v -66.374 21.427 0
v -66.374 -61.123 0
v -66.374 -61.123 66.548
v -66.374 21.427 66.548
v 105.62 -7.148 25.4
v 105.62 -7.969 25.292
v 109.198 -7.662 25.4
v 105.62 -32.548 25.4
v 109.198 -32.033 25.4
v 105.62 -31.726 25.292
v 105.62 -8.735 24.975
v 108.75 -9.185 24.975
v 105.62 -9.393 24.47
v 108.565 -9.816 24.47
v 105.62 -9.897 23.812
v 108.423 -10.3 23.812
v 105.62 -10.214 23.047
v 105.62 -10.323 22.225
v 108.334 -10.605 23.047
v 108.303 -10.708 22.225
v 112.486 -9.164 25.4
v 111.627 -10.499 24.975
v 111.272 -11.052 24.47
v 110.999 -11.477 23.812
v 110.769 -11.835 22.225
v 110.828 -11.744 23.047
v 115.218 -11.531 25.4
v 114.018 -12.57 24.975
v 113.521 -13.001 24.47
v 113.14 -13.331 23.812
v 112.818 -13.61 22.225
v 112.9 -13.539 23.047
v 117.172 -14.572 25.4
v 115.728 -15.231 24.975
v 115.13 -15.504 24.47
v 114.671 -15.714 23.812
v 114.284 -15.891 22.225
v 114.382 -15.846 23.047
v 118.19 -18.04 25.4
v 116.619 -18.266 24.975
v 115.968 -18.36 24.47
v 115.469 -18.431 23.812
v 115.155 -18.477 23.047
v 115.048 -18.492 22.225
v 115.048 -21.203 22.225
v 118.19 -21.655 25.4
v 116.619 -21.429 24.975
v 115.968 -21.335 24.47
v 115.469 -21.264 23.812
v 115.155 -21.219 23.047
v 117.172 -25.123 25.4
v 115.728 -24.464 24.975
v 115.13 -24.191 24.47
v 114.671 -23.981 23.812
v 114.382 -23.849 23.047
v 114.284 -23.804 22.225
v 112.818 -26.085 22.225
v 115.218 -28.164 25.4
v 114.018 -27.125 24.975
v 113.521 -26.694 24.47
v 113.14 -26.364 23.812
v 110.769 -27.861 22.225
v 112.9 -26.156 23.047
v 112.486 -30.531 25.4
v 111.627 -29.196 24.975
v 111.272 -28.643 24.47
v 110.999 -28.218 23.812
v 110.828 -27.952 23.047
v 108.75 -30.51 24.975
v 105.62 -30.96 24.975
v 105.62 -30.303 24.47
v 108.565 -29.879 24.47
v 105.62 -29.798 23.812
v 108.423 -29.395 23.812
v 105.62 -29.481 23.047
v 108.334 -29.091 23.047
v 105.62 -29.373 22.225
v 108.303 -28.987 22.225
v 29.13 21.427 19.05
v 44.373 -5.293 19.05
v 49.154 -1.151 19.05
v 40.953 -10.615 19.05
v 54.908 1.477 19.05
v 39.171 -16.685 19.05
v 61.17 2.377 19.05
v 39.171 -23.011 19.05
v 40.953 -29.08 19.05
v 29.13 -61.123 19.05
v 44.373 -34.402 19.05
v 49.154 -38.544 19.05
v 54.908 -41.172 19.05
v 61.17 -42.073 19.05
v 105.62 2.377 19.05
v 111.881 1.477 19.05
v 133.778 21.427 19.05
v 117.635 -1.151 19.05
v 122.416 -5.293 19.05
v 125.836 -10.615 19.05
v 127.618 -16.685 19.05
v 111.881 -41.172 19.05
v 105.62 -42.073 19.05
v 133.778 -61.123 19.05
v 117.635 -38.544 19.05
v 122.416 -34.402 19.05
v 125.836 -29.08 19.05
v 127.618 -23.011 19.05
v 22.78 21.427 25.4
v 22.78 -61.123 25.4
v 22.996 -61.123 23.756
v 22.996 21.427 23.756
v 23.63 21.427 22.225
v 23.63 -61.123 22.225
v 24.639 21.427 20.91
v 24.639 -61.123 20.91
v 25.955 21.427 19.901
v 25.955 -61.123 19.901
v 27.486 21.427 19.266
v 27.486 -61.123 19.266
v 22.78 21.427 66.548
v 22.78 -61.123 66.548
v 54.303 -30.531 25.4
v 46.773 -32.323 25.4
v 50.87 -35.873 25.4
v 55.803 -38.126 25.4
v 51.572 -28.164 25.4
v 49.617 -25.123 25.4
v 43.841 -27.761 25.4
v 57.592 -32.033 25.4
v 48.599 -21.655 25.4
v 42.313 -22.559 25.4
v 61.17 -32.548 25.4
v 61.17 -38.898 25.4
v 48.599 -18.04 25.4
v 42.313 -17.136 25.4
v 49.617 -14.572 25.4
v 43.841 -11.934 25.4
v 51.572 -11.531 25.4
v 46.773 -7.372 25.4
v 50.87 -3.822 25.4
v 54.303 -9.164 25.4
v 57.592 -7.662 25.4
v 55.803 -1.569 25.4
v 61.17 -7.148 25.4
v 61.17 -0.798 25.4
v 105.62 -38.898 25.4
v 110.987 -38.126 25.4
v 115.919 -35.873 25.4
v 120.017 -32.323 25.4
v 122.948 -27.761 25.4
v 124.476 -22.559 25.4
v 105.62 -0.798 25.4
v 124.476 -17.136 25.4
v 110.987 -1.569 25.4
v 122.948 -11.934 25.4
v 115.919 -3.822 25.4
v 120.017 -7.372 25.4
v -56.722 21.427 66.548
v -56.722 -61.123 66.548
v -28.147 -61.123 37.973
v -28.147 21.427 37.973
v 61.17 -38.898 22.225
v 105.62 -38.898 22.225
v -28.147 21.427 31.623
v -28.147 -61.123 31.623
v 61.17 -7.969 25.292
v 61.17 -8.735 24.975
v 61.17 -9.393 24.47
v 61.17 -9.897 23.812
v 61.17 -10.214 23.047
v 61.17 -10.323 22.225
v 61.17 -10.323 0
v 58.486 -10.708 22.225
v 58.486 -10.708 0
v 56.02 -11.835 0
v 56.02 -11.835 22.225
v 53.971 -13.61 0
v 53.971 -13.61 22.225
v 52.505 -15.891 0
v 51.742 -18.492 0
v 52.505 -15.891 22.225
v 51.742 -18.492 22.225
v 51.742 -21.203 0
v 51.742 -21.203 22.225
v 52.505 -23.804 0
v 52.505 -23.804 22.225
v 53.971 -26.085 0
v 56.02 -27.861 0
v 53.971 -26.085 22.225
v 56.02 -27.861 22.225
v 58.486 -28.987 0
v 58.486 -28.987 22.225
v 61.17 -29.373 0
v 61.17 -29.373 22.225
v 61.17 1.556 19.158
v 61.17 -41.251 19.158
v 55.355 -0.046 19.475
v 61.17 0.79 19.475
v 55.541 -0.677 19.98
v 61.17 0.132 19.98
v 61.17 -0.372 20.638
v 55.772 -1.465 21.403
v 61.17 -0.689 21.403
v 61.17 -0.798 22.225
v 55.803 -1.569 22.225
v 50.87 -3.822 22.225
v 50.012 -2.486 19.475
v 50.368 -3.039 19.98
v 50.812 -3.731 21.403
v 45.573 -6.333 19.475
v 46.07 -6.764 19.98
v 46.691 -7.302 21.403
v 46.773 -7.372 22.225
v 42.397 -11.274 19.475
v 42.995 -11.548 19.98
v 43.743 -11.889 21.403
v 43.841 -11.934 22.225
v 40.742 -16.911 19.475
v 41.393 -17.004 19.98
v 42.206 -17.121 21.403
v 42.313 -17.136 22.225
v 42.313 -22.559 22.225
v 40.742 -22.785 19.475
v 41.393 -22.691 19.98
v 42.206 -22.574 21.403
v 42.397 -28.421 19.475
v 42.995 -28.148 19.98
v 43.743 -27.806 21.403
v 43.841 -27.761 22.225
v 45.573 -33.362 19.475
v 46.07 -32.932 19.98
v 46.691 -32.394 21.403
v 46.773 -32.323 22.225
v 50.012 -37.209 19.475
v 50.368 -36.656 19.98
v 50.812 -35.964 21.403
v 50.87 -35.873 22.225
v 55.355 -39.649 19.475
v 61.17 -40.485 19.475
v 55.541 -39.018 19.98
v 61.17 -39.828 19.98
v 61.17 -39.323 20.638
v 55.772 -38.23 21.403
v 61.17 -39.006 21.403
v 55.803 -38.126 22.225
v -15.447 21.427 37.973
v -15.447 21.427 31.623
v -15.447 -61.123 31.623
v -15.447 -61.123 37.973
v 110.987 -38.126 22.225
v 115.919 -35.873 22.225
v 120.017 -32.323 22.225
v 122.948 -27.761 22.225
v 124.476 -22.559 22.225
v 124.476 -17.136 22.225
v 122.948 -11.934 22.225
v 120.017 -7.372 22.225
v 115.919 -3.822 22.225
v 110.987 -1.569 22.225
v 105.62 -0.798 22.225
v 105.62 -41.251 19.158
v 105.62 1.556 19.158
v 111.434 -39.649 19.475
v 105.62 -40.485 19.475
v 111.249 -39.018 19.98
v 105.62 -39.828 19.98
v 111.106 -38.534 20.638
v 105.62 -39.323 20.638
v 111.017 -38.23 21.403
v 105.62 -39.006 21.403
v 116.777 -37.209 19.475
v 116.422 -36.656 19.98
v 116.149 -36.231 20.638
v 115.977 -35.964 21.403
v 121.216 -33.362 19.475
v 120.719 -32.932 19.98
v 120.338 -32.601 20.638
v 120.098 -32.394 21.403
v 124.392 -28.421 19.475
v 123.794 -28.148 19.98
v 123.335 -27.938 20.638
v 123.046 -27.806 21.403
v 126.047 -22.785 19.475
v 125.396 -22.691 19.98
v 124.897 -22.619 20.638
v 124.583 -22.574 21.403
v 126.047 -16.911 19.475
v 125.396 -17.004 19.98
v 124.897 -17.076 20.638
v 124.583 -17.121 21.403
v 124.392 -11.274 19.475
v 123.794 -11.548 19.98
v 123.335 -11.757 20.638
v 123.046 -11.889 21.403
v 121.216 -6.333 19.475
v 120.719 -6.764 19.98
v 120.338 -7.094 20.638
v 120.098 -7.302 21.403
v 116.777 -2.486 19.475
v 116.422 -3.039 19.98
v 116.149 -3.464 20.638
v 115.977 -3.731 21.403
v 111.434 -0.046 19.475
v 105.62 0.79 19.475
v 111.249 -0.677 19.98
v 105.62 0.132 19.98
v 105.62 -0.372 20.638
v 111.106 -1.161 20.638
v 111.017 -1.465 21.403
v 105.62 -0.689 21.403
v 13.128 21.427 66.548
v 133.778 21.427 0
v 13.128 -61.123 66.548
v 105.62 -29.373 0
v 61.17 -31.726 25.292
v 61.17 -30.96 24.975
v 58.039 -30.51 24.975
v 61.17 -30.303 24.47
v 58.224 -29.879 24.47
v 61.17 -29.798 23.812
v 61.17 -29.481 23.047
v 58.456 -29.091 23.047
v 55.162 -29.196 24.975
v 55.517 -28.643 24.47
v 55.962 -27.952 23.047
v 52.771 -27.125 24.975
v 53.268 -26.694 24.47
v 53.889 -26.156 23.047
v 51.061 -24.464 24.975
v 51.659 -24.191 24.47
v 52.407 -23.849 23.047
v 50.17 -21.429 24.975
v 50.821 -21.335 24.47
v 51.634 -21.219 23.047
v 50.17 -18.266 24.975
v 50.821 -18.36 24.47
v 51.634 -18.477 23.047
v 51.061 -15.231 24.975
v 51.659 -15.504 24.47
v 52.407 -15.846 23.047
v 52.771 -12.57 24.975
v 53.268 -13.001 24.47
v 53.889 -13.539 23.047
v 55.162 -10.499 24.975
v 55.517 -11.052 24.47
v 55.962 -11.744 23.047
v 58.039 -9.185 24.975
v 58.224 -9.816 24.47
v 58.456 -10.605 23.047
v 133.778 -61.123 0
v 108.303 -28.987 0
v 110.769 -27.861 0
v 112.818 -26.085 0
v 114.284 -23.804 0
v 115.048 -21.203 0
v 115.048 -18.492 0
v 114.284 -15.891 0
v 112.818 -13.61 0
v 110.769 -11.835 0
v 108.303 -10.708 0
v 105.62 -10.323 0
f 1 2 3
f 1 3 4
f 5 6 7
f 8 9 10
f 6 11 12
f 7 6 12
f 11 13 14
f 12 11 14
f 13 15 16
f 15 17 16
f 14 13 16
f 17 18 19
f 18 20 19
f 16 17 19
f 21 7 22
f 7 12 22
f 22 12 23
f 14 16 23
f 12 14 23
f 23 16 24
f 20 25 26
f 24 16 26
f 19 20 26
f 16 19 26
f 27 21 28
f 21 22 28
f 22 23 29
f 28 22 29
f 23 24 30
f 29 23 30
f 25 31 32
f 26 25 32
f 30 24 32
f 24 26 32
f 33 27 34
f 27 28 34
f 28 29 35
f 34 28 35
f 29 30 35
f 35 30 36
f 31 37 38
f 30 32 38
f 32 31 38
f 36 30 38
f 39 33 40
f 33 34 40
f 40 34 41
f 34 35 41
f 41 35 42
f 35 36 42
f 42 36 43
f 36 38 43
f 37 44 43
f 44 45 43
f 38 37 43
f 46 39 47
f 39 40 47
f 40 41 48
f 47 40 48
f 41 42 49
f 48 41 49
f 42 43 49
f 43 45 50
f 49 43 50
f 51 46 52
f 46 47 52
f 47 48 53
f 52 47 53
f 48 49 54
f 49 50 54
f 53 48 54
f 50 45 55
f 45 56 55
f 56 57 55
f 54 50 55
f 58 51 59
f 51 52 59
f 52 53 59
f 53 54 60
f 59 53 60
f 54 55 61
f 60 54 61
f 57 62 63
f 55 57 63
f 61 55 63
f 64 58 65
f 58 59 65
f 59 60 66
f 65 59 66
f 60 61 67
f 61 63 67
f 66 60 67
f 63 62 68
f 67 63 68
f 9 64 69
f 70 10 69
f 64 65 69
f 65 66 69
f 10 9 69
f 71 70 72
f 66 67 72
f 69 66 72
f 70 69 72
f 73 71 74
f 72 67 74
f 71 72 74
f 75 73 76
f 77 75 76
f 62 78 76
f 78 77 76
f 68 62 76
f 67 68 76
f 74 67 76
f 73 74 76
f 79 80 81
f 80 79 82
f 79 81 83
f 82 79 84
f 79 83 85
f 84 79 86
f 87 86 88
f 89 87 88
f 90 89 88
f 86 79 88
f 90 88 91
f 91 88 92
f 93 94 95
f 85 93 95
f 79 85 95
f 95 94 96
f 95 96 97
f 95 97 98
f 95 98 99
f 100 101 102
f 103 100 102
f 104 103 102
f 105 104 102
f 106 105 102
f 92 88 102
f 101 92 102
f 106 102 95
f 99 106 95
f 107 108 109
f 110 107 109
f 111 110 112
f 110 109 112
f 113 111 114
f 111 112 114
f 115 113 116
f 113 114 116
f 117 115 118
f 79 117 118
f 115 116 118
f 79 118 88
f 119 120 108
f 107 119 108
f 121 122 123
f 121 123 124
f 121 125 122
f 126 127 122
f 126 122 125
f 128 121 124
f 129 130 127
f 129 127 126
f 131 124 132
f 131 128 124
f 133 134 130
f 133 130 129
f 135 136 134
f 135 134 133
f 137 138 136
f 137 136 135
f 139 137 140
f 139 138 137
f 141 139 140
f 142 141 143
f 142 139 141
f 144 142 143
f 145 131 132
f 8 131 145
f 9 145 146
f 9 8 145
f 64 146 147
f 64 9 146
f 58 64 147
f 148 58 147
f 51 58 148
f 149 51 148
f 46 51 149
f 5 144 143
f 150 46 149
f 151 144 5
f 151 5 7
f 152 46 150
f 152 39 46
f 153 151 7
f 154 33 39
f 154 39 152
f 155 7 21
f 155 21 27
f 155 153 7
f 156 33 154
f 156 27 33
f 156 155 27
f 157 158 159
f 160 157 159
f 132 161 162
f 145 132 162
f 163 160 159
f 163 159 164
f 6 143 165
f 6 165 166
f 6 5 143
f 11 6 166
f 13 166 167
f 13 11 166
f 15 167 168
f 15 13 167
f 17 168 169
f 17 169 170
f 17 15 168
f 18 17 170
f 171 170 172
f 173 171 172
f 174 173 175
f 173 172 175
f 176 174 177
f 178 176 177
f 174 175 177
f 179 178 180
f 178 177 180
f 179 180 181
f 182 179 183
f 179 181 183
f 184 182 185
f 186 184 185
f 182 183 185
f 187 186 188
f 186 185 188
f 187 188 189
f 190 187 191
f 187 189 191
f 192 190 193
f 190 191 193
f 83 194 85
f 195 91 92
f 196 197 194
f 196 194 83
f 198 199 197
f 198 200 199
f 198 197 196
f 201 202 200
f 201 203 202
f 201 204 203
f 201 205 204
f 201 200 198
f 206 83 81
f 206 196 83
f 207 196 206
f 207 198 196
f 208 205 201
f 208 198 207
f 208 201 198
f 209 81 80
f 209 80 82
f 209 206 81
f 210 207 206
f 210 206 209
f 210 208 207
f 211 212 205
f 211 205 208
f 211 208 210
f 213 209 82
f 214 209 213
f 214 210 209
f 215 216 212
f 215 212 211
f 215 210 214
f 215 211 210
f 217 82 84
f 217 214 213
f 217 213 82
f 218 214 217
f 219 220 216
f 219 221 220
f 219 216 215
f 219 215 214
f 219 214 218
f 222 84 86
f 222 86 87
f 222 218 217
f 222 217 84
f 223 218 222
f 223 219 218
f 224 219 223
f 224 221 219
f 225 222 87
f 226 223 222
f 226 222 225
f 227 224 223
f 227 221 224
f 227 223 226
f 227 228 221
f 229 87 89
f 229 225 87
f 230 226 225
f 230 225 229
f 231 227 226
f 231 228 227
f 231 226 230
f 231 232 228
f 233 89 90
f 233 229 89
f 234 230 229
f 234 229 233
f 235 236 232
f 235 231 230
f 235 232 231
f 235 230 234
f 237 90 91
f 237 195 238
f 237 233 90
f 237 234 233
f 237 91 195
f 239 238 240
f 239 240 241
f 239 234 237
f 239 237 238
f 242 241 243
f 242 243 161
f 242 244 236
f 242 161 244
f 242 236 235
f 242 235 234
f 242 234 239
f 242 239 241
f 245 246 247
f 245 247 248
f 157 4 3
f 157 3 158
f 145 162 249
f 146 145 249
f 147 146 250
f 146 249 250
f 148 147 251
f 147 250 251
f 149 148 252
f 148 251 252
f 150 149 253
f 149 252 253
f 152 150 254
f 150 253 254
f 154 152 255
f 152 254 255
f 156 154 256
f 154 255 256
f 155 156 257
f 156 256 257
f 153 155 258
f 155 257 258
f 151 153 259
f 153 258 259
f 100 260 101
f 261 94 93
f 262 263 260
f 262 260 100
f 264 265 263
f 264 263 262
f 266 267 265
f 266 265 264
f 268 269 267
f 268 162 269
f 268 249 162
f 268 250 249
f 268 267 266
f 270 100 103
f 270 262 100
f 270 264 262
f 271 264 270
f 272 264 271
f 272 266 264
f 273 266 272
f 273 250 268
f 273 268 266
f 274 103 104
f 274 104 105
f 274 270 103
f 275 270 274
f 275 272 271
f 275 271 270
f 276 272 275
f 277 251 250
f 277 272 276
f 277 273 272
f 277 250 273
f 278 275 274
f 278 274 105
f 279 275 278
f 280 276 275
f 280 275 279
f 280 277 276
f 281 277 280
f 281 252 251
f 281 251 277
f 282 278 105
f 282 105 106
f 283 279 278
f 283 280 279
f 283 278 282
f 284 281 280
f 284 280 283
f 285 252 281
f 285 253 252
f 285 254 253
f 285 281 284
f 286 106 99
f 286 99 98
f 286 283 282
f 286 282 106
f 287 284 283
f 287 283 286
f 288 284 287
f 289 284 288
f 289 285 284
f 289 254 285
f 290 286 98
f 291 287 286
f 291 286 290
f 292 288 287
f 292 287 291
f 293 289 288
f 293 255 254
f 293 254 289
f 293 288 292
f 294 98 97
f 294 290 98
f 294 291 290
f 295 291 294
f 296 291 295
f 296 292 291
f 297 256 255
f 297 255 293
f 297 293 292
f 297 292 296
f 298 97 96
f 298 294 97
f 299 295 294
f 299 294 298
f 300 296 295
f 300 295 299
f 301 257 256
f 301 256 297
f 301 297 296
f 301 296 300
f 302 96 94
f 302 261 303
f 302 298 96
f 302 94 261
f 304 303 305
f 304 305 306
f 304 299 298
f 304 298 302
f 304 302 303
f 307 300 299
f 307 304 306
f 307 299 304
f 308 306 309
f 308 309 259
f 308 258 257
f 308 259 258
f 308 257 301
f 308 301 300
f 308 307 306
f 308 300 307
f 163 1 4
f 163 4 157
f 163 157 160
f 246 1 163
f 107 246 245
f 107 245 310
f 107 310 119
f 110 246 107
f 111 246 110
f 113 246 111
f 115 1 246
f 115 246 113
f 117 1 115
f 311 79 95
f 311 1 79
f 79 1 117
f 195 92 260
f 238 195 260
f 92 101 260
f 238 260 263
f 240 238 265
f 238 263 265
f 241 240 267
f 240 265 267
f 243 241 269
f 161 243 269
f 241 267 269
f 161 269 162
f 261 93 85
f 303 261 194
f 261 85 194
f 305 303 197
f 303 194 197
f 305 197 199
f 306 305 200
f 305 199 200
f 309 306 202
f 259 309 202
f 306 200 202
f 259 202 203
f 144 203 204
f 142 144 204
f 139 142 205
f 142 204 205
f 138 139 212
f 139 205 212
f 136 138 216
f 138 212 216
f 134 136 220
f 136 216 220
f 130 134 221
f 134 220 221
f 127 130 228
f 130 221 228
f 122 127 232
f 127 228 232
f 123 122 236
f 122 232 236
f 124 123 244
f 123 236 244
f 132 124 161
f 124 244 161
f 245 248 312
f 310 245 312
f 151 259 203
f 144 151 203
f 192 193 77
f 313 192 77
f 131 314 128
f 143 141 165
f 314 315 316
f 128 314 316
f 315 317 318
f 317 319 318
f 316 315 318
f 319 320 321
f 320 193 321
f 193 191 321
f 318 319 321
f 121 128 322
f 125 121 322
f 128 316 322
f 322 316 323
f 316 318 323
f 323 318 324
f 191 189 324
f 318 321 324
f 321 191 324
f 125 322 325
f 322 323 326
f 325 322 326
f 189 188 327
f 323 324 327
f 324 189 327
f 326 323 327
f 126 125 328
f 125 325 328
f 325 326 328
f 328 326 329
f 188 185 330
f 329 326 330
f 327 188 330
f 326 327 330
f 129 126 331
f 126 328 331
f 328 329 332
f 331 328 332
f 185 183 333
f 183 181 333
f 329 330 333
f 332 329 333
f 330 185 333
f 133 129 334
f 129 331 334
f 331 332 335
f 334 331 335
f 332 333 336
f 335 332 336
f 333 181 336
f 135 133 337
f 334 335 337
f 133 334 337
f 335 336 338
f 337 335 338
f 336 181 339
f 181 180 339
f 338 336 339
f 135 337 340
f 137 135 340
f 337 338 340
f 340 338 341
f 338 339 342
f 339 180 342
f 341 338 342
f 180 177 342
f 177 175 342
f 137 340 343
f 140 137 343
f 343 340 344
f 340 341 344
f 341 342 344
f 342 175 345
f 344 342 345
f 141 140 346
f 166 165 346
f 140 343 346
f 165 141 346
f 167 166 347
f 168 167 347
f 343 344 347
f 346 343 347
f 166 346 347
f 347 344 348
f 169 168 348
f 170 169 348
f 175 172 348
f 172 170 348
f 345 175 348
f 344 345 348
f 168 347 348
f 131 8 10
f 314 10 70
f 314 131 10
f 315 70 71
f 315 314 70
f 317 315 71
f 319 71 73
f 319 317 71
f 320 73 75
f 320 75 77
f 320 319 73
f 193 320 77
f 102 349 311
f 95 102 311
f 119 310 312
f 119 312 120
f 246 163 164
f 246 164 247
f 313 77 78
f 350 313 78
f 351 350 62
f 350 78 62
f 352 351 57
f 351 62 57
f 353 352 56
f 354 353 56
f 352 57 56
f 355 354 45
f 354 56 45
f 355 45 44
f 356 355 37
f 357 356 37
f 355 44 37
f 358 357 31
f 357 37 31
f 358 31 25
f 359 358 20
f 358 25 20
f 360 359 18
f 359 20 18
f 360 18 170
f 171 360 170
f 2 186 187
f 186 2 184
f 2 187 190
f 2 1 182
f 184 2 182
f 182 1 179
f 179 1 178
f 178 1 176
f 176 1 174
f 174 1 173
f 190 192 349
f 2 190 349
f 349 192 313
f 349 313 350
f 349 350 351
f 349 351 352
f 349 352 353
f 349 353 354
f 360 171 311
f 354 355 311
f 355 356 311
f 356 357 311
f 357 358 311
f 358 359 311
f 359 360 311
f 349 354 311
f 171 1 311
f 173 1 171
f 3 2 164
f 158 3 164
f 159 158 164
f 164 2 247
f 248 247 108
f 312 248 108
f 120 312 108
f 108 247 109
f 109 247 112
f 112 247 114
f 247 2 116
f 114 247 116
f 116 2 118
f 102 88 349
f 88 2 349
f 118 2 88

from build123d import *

# Parameters (mm, degrees)
F0_W     = 200.152
F0_H     = 82.55
F1_DEPTH = 66.548
F3_DEPTH = 82.551
F5_DEPTH = 82.551
F7_DEPTH = 6.35
F8_DEPTH = 19.051
F9_R     = 3.175


with BuildPart() as f1:
    # F0 (on Top) → F1 (new body)
    with BuildSketch(Plane.XY):
        with Locations((33.701574, -19.847578)):
            Rectangle(F0_W, F0_H)
    extrude(amount=F1_DEPTH)

    # F2 (on face) → F3 (cut, through all)
    with BuildSketch(Plane.XZ.offset(61.122578)):
        Polygon((13.127574, 66.548), (-56.722426, 66.548), (-28.147426, 37.973), (-28.147426, 31.623), (-15.447426, 31.623), (-15.447426, 37.973), align=None)
    extrude(amount=-F3_DEPTH, mode=Mode.SUBTRACT)

    # F4 (on face) → F5 (cut, through all)
    with BuildSketch(Plane.XZ.offset(61.122578)):
        with BuildLine():
            Line((29.129574, 19.05), (133.777574, 19.05))
            Line((133.777574, 19.05), (133.777574, 66.548))
            Line((133.777574, 66.548), (22.779574, 66.548))
            Line((22.779574, 66.548), (22.779574, 25.4))
            ThreePointArc((22.779574, 25.4), (24.639446, 20.909872), (29.129574, 19.05))
        make_face()
    extrude(amount=-F5_DEPTH, mode=Mode.SUBTRACT)

    # F6 (on face) → F7 (join)
    with BuildSketch(Plane.XY.offset(19.05)):
        with BuildLine():
            Line((61.169598, -38.897577), (105.619598, -38.897577))
            ThreePointArc((105.619598, -38.897577), (124.669598, -19.847577), (105.619598, -0.797577))
            Line((105.619598, -0.797577), (61.169598, -0.797577))
            ThreePointArc((61.169598, -0.797577), (42.119598, -19.847577), (61.169598, -38.897577))
        make_face()
        with BuildLine():
            ThreePointArc((105.619598, -10.322577), (115.144598, -19.847577), (105.619598, -29.372577))
            Line((105.619598, -29.372577), (61.169598, -29.372577))
            ThreePointArc((61.169598, -29.372577), (51.644598, -19.847577), (61.169598, -10.322577))
            Line((61.169598, -10.322577), (105.619598, -10.322577))
        make_face(mode=Mode.SUBTRACT)
    extrude(amount=F7_DEPTH)

    # F7_face (on face) → F8 (cut, through all)
    with BuildSketch(Plane(origin=(83.394598, -19.847577, 19.05), x_dir=(1, 0, 0), z_dir=(0, 0, 1))):
        with BuildLine():
            ThreePointArc((-22.225, 9.525), (-31.75, 0), (-22.225, -9.525))
            Line((-22.225, -9.525), (22.225, -9.525))
            ThreePointArc((22.225, -9.525), (31.75, 0), (22.225, 9.525))
            Line((22.225, 9.525), (-22.225, 9.525))
        make_face()
    extrude(amount=-F8_DEPTH, mode=Mode.SUBTRACT)

    # F9
    f9_edges = [f1.edges().sort_by_distance(p)[0] for p in [
        (83.394598, -38.897577, 19.05),
        (42.119598, -19.847577, 19.05),
        (124.669598, -19.847577, 19.05),
        (83.394598, -10.322577, 25.4),
    ]]
    fillet(f9_edges, radius=F9_R)


solid = f1.part
